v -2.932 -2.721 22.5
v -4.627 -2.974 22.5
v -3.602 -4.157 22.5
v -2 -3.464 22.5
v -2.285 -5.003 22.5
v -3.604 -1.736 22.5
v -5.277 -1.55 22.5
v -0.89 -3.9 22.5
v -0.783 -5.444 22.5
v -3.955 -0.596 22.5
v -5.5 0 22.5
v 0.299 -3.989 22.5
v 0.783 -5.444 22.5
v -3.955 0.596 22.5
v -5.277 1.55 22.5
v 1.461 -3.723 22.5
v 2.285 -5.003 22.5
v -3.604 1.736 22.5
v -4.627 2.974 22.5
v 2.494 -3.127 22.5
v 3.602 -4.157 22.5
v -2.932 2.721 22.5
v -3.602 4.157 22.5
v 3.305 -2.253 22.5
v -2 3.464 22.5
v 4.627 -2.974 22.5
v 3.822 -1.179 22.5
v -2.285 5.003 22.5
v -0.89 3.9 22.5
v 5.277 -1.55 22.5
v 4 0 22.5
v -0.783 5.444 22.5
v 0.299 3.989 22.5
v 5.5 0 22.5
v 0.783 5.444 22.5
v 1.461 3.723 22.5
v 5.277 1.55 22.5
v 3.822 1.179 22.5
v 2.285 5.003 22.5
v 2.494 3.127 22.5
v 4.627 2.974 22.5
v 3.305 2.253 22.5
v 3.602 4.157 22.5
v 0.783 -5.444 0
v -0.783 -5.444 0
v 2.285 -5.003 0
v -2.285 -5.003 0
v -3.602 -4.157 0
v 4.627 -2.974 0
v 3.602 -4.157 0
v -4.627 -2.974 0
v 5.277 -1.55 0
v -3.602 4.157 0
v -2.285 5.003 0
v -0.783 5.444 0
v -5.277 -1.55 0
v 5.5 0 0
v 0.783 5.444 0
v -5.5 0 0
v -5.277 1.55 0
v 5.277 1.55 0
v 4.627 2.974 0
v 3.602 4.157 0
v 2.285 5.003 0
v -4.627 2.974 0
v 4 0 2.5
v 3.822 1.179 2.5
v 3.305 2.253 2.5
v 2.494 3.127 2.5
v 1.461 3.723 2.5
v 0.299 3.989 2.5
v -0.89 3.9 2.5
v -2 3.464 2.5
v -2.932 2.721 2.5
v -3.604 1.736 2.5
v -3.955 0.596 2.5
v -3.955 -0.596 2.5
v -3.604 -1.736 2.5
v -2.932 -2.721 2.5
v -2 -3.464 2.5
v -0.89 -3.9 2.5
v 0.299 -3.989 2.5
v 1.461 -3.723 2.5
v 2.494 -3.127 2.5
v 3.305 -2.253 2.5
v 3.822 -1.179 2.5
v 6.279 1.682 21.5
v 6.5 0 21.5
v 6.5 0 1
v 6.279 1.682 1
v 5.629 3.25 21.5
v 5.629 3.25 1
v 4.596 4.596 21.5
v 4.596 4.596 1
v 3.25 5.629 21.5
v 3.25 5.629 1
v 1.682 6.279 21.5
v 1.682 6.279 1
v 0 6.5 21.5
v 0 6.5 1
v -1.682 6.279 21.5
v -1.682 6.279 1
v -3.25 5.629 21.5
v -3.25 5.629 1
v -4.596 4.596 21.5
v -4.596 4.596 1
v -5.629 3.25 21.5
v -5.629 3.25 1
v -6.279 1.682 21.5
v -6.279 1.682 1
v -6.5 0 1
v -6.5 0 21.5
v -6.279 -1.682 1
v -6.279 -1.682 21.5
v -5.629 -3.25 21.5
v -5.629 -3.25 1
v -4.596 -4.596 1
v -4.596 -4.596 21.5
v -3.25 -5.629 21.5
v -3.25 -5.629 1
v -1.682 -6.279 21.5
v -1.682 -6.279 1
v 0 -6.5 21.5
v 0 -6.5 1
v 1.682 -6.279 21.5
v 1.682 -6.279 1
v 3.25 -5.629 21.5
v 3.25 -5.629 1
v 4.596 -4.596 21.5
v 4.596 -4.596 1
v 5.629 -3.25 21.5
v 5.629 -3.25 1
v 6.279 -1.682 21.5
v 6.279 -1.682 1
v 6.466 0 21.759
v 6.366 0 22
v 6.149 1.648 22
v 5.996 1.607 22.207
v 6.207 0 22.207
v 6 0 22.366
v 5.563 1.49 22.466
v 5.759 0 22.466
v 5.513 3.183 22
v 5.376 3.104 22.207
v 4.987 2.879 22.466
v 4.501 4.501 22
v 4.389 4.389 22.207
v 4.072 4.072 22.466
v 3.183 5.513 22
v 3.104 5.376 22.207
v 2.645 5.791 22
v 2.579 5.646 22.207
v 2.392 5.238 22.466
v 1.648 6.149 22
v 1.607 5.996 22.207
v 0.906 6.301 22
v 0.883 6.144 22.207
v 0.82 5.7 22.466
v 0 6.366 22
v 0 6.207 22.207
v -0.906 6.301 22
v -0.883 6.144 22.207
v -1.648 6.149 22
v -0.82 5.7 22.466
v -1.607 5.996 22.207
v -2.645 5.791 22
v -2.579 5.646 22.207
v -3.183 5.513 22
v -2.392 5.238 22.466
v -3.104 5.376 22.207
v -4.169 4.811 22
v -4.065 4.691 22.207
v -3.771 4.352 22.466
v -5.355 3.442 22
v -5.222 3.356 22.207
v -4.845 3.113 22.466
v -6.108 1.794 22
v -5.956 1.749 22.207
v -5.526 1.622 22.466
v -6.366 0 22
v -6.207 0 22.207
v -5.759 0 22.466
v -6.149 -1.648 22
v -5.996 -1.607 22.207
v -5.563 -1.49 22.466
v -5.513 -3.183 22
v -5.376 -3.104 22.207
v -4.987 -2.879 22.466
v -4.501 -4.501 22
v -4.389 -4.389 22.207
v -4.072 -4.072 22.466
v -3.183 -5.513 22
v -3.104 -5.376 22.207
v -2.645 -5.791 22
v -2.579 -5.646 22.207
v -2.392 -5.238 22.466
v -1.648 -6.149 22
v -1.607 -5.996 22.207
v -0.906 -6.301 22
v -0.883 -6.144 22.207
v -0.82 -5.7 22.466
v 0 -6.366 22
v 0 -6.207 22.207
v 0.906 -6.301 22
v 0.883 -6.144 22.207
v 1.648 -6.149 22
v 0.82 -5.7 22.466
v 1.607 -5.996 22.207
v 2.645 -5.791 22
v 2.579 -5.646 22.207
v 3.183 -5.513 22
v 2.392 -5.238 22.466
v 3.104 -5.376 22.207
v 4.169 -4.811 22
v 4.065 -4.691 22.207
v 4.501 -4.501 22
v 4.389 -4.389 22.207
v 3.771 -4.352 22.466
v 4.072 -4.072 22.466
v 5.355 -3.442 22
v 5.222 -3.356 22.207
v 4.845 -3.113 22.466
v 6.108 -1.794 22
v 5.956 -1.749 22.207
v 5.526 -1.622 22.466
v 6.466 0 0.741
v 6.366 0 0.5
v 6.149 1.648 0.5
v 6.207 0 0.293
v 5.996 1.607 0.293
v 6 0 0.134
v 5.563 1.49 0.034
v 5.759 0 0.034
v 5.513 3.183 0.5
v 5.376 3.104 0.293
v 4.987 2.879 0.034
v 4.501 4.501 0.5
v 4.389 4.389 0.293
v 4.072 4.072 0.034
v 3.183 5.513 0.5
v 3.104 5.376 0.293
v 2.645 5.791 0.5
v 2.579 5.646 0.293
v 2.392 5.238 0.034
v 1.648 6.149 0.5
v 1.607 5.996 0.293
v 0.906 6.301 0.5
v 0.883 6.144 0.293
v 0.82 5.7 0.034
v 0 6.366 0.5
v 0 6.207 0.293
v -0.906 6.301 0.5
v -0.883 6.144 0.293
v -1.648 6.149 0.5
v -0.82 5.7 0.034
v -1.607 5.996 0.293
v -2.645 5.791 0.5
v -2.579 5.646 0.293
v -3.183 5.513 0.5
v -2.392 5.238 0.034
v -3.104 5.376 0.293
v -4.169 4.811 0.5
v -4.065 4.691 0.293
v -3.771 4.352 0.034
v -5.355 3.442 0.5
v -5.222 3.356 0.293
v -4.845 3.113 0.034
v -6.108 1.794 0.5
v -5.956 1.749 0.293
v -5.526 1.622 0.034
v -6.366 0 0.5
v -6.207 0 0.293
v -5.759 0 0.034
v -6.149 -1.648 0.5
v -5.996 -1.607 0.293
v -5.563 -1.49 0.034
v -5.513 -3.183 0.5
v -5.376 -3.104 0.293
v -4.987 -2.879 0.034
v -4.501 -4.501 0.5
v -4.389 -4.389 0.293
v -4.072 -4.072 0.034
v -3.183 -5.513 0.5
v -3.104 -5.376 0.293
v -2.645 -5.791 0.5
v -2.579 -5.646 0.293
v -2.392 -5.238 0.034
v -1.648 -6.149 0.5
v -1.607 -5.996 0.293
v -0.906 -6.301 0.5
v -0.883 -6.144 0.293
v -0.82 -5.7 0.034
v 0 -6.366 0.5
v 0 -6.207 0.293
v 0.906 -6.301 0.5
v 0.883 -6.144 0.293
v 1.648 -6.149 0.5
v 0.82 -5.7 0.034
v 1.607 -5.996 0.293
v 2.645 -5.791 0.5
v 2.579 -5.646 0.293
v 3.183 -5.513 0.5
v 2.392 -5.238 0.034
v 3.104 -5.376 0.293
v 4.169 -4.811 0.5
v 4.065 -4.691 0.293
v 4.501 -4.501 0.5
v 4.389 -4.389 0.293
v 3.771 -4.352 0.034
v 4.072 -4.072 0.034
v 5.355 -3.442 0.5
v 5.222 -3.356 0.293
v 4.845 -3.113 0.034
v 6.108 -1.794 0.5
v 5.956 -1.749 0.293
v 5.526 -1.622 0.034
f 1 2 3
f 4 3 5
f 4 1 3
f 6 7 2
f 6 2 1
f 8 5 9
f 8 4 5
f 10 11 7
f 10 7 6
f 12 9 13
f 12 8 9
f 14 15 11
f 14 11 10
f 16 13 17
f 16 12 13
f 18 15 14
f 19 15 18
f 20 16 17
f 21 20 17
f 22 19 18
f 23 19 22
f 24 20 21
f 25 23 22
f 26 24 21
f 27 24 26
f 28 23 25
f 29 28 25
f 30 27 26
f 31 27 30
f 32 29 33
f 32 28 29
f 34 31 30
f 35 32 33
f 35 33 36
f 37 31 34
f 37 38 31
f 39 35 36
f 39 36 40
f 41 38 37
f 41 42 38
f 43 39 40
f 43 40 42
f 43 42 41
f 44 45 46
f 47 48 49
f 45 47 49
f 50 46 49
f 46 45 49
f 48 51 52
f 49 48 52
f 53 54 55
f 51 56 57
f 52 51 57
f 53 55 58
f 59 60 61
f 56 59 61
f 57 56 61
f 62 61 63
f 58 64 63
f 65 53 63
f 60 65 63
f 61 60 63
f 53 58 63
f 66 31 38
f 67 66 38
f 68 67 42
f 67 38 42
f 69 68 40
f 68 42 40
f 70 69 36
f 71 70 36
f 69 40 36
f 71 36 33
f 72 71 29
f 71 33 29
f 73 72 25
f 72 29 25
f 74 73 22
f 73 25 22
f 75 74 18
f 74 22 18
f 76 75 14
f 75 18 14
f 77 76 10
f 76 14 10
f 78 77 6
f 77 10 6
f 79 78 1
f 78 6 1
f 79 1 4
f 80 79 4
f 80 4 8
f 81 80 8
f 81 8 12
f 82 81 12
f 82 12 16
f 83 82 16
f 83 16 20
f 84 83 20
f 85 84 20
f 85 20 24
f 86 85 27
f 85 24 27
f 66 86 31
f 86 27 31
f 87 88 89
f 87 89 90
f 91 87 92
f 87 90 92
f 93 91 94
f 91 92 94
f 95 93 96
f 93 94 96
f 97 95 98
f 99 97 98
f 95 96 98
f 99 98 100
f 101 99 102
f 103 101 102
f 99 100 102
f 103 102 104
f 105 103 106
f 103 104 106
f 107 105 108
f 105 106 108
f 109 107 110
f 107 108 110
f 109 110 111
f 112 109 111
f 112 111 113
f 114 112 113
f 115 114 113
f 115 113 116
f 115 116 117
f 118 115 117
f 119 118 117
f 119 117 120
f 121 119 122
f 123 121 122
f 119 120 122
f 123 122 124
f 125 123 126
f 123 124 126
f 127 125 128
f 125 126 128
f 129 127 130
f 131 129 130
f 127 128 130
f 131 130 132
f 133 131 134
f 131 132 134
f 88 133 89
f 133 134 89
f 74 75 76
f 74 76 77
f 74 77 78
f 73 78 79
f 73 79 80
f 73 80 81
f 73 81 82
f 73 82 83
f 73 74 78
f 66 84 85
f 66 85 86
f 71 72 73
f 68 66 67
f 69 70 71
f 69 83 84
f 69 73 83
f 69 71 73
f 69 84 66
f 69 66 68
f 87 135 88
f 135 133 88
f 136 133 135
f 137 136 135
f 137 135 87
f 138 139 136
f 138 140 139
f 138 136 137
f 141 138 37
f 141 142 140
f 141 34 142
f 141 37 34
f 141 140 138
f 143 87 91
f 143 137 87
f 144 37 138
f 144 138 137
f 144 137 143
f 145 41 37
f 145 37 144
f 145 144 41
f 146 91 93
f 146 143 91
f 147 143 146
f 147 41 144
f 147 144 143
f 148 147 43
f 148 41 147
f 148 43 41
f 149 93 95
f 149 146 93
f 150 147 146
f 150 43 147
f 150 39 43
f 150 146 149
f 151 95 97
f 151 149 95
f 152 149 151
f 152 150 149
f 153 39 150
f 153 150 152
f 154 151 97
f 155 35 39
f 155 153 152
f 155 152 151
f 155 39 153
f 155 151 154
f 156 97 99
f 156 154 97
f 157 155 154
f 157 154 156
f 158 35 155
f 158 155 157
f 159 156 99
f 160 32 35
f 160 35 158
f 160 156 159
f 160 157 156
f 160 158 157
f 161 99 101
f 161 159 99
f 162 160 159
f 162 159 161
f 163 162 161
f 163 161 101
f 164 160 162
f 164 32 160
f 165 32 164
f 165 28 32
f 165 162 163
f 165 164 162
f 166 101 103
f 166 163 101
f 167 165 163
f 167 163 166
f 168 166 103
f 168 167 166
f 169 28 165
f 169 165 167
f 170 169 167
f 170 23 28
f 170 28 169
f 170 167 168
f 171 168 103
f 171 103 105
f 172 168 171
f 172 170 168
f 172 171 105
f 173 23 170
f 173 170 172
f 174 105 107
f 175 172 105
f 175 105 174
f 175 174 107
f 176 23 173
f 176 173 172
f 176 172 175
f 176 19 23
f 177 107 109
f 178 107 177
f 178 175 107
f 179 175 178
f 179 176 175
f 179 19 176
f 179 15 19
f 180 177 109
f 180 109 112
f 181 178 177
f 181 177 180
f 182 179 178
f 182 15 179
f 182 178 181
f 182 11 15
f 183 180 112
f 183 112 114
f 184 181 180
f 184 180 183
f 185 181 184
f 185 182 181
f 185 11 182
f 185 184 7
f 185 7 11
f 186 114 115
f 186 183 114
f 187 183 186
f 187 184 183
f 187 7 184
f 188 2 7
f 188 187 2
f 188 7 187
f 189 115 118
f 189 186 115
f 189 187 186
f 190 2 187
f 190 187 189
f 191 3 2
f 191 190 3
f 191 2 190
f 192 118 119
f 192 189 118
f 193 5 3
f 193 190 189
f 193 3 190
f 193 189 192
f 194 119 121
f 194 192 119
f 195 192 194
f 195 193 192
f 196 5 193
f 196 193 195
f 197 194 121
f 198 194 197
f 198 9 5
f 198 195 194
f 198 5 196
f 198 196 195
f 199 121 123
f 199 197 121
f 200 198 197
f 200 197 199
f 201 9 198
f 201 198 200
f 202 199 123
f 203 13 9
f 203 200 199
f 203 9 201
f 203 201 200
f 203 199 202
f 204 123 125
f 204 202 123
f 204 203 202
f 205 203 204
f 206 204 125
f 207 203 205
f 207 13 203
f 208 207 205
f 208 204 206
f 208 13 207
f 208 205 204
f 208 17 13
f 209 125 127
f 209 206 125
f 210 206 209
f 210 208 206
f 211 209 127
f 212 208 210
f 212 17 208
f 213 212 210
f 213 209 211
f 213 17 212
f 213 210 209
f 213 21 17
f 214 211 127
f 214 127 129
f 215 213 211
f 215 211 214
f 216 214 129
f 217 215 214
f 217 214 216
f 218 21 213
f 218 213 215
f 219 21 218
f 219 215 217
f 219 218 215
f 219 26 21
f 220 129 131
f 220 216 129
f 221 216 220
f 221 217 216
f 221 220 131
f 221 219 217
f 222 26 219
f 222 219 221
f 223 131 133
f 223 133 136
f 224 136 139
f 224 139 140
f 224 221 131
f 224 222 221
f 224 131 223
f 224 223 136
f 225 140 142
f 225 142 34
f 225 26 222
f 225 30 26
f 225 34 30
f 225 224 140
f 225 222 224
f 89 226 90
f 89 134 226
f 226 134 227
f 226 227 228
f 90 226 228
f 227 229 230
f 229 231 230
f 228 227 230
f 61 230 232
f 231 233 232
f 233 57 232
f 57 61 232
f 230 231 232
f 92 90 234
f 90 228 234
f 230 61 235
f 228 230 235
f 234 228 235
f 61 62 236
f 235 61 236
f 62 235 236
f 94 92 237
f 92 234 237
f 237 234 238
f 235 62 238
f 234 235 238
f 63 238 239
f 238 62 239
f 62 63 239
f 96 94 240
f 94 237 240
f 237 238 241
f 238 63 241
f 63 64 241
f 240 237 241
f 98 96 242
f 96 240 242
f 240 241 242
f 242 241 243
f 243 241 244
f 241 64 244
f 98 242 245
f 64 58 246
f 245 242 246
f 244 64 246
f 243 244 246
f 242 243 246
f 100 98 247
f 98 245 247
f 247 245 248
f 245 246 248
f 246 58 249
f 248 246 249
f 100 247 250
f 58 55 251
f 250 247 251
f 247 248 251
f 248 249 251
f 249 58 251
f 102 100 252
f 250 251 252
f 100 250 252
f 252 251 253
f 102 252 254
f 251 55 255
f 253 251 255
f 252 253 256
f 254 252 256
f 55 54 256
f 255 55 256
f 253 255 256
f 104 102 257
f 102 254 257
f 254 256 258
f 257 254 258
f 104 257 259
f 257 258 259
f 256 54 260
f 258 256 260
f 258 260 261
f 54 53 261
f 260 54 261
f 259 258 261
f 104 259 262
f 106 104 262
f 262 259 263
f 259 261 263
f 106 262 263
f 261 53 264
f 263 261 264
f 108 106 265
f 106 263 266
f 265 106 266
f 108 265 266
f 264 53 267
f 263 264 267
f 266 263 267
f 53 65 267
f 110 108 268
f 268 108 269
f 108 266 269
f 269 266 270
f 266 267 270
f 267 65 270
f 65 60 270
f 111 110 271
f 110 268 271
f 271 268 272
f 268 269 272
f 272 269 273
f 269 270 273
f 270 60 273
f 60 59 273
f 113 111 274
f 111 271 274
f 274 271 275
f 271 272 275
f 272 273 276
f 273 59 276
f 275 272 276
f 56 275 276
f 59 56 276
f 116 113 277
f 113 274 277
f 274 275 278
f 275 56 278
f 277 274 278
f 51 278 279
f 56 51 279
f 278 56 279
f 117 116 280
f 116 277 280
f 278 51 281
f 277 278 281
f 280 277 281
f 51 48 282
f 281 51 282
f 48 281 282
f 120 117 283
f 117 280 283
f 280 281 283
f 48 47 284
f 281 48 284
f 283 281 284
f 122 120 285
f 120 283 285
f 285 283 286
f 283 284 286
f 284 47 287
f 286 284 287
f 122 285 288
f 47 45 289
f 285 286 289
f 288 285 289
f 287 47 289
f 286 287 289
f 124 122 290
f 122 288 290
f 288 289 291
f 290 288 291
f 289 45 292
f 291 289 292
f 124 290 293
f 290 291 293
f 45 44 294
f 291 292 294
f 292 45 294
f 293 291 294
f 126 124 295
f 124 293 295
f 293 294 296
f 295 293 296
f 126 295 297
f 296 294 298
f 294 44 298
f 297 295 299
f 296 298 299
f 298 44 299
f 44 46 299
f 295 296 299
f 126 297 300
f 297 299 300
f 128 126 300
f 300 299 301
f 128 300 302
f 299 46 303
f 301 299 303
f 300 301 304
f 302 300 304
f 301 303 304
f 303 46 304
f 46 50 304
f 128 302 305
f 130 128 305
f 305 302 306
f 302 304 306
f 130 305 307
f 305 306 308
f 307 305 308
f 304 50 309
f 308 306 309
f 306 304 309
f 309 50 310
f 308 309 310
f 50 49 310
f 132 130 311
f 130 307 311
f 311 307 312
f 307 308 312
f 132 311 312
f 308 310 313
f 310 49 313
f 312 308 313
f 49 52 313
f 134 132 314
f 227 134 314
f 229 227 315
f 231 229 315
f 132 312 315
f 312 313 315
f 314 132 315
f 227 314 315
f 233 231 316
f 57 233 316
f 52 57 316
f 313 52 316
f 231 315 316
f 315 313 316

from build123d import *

# Parameters (mm, degrees)
SKETCH_R     = 6.5
PAD_DEPTH    = 22.5
SKETCH001_R  = 4
POCKET_DEPTH = 20
FILLET_R     = 1


with BuildPart() as part:
    # Sketch → Pad (new body)
    with BuildSketch(Plane.XY):
        Circle(SKETCH_R)
    extrude(amount=PAD_DEPTH)

    # Sketch001 (on Face3 of Pad) → Pocket (cut)
    with BuildSketch(Plane.XY.offset(22.5)):
        Circle(SKETCH001_R)
    extrude(amount=-POCKET_DEPTH, mode=Mode.SUBTRACT)

    # Fillet
    fillet_edges = [part.edges().sort_by_distance(p)[0] for p in [
        (6.5, 0, 11.25),
        (-6.5, 0, 0),
        (-6.5, 0, 22.5),
    ]]
    fillet(fillet_edges, radius=FILLET_R)


solid = part.part
